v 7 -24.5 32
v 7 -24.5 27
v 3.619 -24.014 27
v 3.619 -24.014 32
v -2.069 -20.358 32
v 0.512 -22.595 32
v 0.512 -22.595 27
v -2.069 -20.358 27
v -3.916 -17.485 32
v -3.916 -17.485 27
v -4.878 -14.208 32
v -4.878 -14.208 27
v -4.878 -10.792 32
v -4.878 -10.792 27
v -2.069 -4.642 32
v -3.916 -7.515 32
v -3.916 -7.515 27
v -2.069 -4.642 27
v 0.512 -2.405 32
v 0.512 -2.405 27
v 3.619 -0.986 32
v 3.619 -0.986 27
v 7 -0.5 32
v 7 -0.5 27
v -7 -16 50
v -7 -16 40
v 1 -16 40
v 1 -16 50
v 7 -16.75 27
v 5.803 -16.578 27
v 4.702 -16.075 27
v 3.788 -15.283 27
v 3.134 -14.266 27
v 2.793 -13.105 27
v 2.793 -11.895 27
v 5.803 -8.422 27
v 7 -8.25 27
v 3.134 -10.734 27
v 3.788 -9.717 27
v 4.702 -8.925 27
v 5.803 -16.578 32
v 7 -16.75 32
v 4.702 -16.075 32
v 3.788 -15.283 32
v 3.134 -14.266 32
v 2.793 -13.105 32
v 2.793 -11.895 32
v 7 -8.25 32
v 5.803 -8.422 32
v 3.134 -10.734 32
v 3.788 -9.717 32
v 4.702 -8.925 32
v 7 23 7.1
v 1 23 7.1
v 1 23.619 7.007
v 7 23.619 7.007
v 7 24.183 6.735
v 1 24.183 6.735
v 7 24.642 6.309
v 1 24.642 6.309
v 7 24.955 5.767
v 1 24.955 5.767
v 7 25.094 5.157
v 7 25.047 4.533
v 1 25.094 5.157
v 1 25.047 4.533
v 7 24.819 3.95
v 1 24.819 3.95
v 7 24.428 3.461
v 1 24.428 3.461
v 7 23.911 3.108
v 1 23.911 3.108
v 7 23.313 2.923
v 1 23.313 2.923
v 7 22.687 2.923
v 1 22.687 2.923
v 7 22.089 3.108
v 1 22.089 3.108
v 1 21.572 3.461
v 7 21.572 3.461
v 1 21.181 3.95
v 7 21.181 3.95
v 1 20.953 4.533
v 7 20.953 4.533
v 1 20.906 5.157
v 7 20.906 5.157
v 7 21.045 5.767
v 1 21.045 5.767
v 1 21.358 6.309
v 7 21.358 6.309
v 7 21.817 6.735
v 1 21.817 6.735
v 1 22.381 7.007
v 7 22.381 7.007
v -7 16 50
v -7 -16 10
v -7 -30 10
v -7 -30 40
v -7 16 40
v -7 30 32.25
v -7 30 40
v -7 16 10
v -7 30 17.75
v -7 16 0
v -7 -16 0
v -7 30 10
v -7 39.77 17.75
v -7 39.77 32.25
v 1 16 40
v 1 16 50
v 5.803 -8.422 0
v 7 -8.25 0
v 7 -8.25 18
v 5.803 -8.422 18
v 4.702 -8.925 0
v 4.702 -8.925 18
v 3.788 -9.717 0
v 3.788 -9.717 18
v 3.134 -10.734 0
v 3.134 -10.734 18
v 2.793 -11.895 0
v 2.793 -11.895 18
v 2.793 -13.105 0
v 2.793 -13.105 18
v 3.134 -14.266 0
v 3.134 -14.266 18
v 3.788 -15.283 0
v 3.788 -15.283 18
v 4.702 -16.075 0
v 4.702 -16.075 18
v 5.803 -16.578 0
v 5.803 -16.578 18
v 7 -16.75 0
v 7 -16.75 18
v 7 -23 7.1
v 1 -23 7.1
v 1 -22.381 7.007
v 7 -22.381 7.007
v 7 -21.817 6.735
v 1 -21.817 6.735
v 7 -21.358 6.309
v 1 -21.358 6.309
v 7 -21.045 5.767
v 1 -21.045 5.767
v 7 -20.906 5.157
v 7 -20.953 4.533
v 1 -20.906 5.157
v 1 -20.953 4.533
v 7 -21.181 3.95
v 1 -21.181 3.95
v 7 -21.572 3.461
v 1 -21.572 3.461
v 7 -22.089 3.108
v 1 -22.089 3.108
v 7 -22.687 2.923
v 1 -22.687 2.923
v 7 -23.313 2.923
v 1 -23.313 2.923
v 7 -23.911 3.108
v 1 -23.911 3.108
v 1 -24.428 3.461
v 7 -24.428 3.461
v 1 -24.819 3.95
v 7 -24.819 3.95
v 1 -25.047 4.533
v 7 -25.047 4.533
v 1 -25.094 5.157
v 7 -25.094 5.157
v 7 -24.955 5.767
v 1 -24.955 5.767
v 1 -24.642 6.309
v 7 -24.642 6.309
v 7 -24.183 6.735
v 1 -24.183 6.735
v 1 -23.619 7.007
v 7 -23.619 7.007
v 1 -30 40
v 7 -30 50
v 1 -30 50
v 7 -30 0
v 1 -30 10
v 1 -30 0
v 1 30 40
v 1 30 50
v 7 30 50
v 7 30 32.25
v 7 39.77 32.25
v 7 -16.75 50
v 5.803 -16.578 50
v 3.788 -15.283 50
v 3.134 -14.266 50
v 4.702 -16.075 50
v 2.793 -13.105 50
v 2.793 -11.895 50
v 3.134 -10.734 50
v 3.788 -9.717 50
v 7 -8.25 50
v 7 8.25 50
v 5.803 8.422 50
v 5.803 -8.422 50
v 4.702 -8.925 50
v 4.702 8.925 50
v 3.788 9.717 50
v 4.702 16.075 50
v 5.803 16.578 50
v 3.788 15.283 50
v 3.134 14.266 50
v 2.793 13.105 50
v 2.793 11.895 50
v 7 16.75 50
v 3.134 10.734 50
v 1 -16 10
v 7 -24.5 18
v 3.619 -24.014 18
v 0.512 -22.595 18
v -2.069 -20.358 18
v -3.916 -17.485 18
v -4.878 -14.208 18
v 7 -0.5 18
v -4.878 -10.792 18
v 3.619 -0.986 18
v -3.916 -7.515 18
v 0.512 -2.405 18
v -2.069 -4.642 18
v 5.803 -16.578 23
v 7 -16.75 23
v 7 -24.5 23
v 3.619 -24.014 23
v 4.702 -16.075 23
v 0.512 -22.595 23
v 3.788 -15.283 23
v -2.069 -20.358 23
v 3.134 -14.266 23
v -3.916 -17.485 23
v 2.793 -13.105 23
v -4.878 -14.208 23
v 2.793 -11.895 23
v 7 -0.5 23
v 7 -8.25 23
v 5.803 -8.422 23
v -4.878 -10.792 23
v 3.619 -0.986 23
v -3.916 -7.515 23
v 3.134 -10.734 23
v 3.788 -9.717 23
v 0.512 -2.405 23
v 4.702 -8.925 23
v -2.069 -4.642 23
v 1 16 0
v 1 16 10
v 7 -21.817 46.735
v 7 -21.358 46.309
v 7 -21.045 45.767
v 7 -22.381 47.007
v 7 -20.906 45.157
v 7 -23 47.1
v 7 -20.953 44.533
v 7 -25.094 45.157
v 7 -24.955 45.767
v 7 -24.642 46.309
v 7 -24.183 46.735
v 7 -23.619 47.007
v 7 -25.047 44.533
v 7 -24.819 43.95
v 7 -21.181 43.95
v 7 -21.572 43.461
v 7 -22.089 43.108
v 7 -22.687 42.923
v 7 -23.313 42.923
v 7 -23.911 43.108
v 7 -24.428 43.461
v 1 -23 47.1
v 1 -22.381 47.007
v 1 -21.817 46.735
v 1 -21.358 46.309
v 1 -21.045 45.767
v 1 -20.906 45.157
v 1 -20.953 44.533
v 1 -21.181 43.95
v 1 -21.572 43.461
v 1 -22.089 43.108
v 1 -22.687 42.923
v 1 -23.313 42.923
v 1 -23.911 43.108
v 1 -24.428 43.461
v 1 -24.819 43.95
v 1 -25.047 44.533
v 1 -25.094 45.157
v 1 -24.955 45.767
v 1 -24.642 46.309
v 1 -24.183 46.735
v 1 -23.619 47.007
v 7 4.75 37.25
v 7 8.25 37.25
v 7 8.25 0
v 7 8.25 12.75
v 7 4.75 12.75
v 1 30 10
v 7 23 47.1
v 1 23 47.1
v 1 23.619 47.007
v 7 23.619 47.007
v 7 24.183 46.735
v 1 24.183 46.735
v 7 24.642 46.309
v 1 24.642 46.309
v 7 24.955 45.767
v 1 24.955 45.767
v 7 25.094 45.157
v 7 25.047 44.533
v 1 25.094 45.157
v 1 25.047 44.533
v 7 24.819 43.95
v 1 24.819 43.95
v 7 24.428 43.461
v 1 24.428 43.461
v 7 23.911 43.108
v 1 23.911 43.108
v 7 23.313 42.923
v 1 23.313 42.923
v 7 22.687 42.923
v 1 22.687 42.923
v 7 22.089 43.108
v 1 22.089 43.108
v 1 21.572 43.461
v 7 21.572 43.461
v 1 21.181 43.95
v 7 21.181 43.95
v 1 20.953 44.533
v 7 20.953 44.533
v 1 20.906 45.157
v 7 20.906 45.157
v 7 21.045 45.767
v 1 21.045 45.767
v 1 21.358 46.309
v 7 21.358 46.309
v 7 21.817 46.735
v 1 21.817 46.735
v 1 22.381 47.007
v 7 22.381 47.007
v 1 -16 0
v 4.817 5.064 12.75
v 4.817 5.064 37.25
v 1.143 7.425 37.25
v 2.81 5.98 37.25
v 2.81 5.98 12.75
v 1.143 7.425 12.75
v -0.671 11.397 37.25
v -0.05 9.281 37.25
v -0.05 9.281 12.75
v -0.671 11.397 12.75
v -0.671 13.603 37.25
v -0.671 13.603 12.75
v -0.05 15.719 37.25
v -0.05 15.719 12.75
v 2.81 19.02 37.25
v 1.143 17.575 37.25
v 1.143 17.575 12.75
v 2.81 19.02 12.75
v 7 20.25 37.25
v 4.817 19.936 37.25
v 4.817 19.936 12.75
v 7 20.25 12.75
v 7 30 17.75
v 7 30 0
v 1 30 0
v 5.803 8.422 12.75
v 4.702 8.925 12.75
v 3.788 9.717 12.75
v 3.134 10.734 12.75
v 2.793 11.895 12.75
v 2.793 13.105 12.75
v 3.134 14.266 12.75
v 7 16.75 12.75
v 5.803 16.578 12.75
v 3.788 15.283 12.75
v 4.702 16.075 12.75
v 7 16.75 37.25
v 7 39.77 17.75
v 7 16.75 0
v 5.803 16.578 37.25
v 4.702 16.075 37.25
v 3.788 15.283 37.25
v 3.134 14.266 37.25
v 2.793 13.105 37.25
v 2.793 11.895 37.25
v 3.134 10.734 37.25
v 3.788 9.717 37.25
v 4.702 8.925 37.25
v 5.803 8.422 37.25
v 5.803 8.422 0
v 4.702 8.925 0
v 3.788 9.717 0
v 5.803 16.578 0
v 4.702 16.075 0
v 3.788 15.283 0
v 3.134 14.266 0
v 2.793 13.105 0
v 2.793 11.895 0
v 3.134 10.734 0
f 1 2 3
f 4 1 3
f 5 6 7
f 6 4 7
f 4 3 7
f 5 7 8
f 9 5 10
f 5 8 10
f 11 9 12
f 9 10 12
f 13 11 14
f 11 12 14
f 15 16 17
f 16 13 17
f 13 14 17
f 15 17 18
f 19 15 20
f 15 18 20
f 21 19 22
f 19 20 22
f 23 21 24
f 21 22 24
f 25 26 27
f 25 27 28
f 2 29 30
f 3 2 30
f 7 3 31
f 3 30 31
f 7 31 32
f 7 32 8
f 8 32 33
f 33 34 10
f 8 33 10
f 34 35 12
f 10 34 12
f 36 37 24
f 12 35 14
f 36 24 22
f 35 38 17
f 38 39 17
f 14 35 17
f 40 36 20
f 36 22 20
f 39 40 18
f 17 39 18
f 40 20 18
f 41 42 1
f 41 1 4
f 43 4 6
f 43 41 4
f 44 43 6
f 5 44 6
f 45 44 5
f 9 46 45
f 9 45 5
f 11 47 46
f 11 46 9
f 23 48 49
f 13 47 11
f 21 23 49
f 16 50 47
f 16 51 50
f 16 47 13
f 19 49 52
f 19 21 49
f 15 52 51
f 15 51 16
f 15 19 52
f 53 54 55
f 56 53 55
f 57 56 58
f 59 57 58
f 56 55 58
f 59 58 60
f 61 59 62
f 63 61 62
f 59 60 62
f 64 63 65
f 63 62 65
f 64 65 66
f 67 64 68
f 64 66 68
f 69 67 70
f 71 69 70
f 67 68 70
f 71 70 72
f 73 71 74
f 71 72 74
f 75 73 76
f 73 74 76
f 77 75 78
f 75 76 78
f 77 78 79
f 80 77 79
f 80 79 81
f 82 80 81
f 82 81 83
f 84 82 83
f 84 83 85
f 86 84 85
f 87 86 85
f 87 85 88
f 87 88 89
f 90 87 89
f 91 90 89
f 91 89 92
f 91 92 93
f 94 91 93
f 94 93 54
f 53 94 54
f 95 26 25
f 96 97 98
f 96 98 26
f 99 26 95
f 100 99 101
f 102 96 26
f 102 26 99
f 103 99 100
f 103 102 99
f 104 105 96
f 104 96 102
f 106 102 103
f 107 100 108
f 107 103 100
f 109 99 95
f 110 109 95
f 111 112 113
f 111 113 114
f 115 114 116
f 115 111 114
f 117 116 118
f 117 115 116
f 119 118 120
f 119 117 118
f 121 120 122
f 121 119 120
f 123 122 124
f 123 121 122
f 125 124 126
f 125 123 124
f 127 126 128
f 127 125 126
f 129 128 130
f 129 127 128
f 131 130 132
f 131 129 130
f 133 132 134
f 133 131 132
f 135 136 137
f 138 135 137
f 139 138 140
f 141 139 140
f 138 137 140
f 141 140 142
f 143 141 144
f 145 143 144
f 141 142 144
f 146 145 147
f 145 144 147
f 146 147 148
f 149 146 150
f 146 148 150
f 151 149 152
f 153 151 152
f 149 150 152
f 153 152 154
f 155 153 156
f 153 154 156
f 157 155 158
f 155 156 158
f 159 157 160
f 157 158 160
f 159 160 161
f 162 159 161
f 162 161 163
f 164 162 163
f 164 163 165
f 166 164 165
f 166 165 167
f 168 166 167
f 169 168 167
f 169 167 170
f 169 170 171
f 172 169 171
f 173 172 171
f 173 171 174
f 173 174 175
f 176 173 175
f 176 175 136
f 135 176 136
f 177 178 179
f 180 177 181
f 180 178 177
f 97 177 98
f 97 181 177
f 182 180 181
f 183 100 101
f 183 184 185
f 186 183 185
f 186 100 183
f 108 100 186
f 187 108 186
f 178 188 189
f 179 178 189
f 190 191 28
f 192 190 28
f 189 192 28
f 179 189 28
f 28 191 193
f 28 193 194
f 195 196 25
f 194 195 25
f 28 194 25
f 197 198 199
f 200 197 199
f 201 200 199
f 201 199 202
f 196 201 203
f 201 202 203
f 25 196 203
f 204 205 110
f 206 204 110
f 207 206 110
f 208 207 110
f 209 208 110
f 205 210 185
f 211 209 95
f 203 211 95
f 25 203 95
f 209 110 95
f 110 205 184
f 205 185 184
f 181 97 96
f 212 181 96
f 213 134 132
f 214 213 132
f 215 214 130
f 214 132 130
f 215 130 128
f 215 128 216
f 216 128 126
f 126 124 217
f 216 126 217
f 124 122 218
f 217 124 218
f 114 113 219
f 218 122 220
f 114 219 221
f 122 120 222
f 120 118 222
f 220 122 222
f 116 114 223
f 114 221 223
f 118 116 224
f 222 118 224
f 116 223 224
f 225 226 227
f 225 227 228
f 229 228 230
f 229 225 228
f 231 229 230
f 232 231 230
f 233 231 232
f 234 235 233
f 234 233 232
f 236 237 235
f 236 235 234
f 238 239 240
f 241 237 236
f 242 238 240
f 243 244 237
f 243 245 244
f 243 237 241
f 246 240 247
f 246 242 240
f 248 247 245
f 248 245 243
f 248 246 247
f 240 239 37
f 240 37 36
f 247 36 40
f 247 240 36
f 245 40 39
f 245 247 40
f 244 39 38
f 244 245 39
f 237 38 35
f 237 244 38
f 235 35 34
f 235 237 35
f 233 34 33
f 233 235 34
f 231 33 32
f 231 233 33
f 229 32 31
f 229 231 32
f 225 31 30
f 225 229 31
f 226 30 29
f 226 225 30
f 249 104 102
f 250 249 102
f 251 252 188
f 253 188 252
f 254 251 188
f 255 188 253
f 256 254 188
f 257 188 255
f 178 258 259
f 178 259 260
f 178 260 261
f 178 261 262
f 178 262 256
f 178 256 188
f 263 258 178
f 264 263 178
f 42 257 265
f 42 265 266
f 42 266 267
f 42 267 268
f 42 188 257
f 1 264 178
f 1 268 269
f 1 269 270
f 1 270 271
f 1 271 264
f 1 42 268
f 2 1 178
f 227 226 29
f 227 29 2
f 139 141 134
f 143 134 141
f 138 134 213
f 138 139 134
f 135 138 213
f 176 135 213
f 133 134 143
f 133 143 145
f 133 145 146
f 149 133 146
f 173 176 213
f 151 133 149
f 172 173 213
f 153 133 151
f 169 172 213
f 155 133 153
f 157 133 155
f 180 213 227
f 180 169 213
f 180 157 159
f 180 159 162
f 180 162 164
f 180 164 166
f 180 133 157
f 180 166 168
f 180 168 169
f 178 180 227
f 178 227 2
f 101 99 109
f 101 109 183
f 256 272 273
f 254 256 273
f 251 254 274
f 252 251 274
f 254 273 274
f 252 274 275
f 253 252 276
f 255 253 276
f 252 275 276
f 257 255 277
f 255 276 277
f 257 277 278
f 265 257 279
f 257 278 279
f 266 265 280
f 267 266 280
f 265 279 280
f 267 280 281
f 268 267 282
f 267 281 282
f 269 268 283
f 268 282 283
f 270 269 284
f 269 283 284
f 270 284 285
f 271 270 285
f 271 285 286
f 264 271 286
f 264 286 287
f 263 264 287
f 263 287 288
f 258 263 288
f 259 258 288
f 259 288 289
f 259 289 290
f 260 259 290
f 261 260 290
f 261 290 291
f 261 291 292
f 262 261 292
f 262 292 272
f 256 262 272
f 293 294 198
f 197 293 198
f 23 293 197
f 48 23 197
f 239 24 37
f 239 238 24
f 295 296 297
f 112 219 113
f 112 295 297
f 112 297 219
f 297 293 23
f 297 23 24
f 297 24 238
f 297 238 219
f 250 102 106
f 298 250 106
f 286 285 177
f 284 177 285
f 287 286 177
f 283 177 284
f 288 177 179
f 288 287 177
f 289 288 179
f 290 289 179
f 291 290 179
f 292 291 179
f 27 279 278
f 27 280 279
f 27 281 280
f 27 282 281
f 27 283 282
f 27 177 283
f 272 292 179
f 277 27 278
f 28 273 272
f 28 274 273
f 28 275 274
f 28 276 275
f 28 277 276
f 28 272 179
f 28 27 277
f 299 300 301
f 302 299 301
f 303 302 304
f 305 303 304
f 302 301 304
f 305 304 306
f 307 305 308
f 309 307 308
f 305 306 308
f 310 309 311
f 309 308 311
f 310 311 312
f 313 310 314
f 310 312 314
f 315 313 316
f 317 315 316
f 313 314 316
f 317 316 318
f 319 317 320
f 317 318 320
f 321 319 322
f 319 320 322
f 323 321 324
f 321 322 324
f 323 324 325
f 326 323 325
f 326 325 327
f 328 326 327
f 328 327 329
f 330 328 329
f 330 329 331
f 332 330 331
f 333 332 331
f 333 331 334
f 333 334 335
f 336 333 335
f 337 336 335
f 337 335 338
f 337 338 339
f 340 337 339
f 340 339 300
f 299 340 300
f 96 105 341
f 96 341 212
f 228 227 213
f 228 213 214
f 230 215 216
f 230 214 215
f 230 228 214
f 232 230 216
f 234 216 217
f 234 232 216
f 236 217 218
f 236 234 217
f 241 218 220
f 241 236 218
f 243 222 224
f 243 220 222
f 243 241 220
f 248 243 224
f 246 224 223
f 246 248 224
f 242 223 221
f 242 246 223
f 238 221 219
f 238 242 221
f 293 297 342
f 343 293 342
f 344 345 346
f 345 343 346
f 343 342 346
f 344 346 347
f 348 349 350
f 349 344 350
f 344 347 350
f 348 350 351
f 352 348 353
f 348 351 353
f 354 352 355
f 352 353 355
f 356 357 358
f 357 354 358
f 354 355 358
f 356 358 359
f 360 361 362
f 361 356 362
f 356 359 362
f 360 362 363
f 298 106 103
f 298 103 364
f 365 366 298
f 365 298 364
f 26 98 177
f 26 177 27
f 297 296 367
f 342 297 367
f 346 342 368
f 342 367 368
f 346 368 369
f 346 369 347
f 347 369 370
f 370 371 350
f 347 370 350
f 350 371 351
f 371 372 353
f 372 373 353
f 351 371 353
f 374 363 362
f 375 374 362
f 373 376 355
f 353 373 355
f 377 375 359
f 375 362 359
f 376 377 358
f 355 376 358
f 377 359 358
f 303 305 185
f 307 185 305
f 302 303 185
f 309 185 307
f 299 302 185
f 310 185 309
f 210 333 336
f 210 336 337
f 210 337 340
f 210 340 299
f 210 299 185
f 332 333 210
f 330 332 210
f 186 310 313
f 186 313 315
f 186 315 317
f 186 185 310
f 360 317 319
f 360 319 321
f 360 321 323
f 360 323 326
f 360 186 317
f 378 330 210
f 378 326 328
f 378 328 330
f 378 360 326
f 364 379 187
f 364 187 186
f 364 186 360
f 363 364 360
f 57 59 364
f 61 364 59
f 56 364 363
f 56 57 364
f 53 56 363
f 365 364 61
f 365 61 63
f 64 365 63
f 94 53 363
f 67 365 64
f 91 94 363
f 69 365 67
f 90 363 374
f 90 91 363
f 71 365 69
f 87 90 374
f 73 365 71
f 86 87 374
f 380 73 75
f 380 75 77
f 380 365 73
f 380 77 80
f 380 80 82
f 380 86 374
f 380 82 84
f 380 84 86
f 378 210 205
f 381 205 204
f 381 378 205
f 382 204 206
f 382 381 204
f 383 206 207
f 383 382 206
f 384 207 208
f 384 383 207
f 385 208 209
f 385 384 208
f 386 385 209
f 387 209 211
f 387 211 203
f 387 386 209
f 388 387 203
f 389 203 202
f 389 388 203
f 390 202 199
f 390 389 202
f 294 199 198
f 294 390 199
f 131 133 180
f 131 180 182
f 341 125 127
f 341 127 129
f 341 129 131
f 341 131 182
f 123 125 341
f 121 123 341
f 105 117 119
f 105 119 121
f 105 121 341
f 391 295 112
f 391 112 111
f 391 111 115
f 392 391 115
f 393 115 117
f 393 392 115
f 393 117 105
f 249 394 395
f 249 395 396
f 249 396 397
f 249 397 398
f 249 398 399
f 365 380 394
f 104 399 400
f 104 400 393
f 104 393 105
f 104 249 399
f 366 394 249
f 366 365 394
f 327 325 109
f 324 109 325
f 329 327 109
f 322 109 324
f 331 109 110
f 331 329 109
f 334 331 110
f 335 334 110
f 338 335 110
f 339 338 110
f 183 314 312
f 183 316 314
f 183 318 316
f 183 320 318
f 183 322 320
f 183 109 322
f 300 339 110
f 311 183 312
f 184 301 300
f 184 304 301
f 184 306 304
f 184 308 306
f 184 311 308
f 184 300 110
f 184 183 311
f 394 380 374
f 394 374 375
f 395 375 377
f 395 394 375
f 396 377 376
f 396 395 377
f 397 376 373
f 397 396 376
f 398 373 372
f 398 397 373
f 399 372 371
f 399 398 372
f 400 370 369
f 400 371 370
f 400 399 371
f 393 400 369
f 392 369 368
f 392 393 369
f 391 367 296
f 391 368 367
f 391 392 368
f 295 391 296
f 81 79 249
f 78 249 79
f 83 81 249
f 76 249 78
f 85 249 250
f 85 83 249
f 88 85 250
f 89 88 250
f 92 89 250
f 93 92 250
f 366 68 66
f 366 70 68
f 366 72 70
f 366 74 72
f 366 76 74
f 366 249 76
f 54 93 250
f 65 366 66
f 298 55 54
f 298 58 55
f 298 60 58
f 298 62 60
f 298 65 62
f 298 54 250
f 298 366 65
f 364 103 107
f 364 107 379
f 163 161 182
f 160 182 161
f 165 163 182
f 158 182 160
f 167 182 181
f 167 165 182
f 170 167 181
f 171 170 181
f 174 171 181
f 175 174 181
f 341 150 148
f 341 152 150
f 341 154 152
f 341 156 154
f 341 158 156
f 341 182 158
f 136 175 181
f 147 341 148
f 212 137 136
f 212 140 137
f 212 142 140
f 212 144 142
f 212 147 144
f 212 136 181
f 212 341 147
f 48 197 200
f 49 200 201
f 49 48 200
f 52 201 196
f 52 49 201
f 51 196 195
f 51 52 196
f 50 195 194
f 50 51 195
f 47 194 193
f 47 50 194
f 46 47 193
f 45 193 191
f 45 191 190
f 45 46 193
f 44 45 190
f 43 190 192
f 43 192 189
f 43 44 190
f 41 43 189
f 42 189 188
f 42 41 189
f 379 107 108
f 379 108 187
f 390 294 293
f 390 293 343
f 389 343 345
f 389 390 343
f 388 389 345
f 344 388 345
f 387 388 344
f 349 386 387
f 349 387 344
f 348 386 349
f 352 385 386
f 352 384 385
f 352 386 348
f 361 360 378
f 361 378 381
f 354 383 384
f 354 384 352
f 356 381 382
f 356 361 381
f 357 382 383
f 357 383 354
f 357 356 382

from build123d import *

# Parameters (mm, degrees)
BOSS_EXTRUDE1_DEPTH = 50
SKETCH2_R           = 7.75
CUT_EXTRUDE1_DEPTH  = 12.25
SKETCH4_R           = 12
CUT_EXTRUDE2_DEPTH  = 5
SKETCH5_W           = 10
SKETCH5_H           = 14
CUT_EXTRUDE3_DEPTH  = 8
SKETCH6_R           = 2.1
CUT_EXTRUDE4_DEPTH  = 7
SKETCH7_W           = 14
SKETCH7_H           = 14.5
BOSS_EXTRUDE2_DEPTH = 9.77


with BuildPart() as part:
    # Sketch1 → Boss-Extrude1 (new body)
    with BuildSketch(Plane.XY):
        with BuildLine():
            Line((-7, 30), (7, 30))
            Line((7, 30), (7, 16.75))
            ThreePointArc((7, 16.75), (2.75, 12.5), (7, 8.25))
            Line((7, 8.25), (7, -8.25))
            ThreePointArc((7, -8.25), (2.75, -12.5), (7, -16.75))
            Line((7, -16.75), (7, -30))
            Line((7, -30), (-7, -30))
            Line((-7, -30), (-7, 30))
        make_face()
    extrude(amount=BOSS_EXTRUDE1_DEPTH)

    # Sketch2 → Cut-Extrude1 (cut, symmetric)
    with BuildSketch(Plane(origin=(0, 0, 25), x_dir=(-1, 0, 0), z_dir=(0, 0, -1))):
        with Locations((-7, 12.5)):
            Circle(SKETCH2_R)
    extrude(amount=CUT_EXTRUDE1_DEPTH, both=True, mode=Mode.SUBTRACT)

    # Sketch4 → Cut-Extrude2 (cut)
    with BuildSketch(Plane(origin=(0, 0, 23), x_dir=(-1, 0, 0), z_dir=(0, 0, -1))):
        with Locations((-7, -12.5)):
            Circle(SKETCH4_R)
    cut_extrude2 = extrude(amount=CUT_EXTRUDE2_DEPTH, mode=Mode.SUBTRACT)

    # Mirror1: Cut-Extrude2 across plane
    add(cut_extrude2.mirror(Plane(origin=(0, 0, 25), x_dir=(1, 0, 0), z_dir=(0, 0, -1))), mode=Mode.SUBTRACT)

    # Sketch5 → Cut-Extrude3 (cut)
    with BuildSketch(Plane.ZY.offset(7)):
        with Locations((5, 23)):
            Rectangle(SKETCH5_W, SKETCH5_H)
        with Locations((45, 23)):
            Rectangle(SKETCH5_W, SKETCH5_H)
        with Locations((45, -23)):
            Rectangle(SKETCH5_W, SKETCH5_H)
        with Locations((5, -23)):
            Rectangle(SKETCH5_W, SKETCH5_H)
    extrude(amount=-CUT_EXTRUDE3_DEPTH, mode=Mode.SUBTRACT)

    # Sketch6 → Cut-Extrude4 (cut, through all)
    with BuildSketch(Plane.ZY.offset(-1)):
        with Locations((5, 23)):
            Circle(SKETCH6_R)
        with Locations((45, 23)):
            Circle(SKETCH6_R)
        with Locations((5, -23)):
            Circle(SKETCH6_R)
        with Locations((45, -23)):
            Circle(SKETCH6_R)
    extrude(amount=-CUT_EXTRUDE4_DEPTH, mode=Mode.SUBTRACT)

    # Sketch7 → Boss-Extrude2 (add)
    with BuildSketch(Plane(origin=(0, 30, 0), x_dir=(1, 0, 0), z_dir=(0, 1, 0))):
        with Locations((0, -25)):
            Rectangle(SKETCH7_W, SKETCH7_H)
    extrude(amount=BOSS_EXTRUDE2_DEPTH)


solid = part.part
